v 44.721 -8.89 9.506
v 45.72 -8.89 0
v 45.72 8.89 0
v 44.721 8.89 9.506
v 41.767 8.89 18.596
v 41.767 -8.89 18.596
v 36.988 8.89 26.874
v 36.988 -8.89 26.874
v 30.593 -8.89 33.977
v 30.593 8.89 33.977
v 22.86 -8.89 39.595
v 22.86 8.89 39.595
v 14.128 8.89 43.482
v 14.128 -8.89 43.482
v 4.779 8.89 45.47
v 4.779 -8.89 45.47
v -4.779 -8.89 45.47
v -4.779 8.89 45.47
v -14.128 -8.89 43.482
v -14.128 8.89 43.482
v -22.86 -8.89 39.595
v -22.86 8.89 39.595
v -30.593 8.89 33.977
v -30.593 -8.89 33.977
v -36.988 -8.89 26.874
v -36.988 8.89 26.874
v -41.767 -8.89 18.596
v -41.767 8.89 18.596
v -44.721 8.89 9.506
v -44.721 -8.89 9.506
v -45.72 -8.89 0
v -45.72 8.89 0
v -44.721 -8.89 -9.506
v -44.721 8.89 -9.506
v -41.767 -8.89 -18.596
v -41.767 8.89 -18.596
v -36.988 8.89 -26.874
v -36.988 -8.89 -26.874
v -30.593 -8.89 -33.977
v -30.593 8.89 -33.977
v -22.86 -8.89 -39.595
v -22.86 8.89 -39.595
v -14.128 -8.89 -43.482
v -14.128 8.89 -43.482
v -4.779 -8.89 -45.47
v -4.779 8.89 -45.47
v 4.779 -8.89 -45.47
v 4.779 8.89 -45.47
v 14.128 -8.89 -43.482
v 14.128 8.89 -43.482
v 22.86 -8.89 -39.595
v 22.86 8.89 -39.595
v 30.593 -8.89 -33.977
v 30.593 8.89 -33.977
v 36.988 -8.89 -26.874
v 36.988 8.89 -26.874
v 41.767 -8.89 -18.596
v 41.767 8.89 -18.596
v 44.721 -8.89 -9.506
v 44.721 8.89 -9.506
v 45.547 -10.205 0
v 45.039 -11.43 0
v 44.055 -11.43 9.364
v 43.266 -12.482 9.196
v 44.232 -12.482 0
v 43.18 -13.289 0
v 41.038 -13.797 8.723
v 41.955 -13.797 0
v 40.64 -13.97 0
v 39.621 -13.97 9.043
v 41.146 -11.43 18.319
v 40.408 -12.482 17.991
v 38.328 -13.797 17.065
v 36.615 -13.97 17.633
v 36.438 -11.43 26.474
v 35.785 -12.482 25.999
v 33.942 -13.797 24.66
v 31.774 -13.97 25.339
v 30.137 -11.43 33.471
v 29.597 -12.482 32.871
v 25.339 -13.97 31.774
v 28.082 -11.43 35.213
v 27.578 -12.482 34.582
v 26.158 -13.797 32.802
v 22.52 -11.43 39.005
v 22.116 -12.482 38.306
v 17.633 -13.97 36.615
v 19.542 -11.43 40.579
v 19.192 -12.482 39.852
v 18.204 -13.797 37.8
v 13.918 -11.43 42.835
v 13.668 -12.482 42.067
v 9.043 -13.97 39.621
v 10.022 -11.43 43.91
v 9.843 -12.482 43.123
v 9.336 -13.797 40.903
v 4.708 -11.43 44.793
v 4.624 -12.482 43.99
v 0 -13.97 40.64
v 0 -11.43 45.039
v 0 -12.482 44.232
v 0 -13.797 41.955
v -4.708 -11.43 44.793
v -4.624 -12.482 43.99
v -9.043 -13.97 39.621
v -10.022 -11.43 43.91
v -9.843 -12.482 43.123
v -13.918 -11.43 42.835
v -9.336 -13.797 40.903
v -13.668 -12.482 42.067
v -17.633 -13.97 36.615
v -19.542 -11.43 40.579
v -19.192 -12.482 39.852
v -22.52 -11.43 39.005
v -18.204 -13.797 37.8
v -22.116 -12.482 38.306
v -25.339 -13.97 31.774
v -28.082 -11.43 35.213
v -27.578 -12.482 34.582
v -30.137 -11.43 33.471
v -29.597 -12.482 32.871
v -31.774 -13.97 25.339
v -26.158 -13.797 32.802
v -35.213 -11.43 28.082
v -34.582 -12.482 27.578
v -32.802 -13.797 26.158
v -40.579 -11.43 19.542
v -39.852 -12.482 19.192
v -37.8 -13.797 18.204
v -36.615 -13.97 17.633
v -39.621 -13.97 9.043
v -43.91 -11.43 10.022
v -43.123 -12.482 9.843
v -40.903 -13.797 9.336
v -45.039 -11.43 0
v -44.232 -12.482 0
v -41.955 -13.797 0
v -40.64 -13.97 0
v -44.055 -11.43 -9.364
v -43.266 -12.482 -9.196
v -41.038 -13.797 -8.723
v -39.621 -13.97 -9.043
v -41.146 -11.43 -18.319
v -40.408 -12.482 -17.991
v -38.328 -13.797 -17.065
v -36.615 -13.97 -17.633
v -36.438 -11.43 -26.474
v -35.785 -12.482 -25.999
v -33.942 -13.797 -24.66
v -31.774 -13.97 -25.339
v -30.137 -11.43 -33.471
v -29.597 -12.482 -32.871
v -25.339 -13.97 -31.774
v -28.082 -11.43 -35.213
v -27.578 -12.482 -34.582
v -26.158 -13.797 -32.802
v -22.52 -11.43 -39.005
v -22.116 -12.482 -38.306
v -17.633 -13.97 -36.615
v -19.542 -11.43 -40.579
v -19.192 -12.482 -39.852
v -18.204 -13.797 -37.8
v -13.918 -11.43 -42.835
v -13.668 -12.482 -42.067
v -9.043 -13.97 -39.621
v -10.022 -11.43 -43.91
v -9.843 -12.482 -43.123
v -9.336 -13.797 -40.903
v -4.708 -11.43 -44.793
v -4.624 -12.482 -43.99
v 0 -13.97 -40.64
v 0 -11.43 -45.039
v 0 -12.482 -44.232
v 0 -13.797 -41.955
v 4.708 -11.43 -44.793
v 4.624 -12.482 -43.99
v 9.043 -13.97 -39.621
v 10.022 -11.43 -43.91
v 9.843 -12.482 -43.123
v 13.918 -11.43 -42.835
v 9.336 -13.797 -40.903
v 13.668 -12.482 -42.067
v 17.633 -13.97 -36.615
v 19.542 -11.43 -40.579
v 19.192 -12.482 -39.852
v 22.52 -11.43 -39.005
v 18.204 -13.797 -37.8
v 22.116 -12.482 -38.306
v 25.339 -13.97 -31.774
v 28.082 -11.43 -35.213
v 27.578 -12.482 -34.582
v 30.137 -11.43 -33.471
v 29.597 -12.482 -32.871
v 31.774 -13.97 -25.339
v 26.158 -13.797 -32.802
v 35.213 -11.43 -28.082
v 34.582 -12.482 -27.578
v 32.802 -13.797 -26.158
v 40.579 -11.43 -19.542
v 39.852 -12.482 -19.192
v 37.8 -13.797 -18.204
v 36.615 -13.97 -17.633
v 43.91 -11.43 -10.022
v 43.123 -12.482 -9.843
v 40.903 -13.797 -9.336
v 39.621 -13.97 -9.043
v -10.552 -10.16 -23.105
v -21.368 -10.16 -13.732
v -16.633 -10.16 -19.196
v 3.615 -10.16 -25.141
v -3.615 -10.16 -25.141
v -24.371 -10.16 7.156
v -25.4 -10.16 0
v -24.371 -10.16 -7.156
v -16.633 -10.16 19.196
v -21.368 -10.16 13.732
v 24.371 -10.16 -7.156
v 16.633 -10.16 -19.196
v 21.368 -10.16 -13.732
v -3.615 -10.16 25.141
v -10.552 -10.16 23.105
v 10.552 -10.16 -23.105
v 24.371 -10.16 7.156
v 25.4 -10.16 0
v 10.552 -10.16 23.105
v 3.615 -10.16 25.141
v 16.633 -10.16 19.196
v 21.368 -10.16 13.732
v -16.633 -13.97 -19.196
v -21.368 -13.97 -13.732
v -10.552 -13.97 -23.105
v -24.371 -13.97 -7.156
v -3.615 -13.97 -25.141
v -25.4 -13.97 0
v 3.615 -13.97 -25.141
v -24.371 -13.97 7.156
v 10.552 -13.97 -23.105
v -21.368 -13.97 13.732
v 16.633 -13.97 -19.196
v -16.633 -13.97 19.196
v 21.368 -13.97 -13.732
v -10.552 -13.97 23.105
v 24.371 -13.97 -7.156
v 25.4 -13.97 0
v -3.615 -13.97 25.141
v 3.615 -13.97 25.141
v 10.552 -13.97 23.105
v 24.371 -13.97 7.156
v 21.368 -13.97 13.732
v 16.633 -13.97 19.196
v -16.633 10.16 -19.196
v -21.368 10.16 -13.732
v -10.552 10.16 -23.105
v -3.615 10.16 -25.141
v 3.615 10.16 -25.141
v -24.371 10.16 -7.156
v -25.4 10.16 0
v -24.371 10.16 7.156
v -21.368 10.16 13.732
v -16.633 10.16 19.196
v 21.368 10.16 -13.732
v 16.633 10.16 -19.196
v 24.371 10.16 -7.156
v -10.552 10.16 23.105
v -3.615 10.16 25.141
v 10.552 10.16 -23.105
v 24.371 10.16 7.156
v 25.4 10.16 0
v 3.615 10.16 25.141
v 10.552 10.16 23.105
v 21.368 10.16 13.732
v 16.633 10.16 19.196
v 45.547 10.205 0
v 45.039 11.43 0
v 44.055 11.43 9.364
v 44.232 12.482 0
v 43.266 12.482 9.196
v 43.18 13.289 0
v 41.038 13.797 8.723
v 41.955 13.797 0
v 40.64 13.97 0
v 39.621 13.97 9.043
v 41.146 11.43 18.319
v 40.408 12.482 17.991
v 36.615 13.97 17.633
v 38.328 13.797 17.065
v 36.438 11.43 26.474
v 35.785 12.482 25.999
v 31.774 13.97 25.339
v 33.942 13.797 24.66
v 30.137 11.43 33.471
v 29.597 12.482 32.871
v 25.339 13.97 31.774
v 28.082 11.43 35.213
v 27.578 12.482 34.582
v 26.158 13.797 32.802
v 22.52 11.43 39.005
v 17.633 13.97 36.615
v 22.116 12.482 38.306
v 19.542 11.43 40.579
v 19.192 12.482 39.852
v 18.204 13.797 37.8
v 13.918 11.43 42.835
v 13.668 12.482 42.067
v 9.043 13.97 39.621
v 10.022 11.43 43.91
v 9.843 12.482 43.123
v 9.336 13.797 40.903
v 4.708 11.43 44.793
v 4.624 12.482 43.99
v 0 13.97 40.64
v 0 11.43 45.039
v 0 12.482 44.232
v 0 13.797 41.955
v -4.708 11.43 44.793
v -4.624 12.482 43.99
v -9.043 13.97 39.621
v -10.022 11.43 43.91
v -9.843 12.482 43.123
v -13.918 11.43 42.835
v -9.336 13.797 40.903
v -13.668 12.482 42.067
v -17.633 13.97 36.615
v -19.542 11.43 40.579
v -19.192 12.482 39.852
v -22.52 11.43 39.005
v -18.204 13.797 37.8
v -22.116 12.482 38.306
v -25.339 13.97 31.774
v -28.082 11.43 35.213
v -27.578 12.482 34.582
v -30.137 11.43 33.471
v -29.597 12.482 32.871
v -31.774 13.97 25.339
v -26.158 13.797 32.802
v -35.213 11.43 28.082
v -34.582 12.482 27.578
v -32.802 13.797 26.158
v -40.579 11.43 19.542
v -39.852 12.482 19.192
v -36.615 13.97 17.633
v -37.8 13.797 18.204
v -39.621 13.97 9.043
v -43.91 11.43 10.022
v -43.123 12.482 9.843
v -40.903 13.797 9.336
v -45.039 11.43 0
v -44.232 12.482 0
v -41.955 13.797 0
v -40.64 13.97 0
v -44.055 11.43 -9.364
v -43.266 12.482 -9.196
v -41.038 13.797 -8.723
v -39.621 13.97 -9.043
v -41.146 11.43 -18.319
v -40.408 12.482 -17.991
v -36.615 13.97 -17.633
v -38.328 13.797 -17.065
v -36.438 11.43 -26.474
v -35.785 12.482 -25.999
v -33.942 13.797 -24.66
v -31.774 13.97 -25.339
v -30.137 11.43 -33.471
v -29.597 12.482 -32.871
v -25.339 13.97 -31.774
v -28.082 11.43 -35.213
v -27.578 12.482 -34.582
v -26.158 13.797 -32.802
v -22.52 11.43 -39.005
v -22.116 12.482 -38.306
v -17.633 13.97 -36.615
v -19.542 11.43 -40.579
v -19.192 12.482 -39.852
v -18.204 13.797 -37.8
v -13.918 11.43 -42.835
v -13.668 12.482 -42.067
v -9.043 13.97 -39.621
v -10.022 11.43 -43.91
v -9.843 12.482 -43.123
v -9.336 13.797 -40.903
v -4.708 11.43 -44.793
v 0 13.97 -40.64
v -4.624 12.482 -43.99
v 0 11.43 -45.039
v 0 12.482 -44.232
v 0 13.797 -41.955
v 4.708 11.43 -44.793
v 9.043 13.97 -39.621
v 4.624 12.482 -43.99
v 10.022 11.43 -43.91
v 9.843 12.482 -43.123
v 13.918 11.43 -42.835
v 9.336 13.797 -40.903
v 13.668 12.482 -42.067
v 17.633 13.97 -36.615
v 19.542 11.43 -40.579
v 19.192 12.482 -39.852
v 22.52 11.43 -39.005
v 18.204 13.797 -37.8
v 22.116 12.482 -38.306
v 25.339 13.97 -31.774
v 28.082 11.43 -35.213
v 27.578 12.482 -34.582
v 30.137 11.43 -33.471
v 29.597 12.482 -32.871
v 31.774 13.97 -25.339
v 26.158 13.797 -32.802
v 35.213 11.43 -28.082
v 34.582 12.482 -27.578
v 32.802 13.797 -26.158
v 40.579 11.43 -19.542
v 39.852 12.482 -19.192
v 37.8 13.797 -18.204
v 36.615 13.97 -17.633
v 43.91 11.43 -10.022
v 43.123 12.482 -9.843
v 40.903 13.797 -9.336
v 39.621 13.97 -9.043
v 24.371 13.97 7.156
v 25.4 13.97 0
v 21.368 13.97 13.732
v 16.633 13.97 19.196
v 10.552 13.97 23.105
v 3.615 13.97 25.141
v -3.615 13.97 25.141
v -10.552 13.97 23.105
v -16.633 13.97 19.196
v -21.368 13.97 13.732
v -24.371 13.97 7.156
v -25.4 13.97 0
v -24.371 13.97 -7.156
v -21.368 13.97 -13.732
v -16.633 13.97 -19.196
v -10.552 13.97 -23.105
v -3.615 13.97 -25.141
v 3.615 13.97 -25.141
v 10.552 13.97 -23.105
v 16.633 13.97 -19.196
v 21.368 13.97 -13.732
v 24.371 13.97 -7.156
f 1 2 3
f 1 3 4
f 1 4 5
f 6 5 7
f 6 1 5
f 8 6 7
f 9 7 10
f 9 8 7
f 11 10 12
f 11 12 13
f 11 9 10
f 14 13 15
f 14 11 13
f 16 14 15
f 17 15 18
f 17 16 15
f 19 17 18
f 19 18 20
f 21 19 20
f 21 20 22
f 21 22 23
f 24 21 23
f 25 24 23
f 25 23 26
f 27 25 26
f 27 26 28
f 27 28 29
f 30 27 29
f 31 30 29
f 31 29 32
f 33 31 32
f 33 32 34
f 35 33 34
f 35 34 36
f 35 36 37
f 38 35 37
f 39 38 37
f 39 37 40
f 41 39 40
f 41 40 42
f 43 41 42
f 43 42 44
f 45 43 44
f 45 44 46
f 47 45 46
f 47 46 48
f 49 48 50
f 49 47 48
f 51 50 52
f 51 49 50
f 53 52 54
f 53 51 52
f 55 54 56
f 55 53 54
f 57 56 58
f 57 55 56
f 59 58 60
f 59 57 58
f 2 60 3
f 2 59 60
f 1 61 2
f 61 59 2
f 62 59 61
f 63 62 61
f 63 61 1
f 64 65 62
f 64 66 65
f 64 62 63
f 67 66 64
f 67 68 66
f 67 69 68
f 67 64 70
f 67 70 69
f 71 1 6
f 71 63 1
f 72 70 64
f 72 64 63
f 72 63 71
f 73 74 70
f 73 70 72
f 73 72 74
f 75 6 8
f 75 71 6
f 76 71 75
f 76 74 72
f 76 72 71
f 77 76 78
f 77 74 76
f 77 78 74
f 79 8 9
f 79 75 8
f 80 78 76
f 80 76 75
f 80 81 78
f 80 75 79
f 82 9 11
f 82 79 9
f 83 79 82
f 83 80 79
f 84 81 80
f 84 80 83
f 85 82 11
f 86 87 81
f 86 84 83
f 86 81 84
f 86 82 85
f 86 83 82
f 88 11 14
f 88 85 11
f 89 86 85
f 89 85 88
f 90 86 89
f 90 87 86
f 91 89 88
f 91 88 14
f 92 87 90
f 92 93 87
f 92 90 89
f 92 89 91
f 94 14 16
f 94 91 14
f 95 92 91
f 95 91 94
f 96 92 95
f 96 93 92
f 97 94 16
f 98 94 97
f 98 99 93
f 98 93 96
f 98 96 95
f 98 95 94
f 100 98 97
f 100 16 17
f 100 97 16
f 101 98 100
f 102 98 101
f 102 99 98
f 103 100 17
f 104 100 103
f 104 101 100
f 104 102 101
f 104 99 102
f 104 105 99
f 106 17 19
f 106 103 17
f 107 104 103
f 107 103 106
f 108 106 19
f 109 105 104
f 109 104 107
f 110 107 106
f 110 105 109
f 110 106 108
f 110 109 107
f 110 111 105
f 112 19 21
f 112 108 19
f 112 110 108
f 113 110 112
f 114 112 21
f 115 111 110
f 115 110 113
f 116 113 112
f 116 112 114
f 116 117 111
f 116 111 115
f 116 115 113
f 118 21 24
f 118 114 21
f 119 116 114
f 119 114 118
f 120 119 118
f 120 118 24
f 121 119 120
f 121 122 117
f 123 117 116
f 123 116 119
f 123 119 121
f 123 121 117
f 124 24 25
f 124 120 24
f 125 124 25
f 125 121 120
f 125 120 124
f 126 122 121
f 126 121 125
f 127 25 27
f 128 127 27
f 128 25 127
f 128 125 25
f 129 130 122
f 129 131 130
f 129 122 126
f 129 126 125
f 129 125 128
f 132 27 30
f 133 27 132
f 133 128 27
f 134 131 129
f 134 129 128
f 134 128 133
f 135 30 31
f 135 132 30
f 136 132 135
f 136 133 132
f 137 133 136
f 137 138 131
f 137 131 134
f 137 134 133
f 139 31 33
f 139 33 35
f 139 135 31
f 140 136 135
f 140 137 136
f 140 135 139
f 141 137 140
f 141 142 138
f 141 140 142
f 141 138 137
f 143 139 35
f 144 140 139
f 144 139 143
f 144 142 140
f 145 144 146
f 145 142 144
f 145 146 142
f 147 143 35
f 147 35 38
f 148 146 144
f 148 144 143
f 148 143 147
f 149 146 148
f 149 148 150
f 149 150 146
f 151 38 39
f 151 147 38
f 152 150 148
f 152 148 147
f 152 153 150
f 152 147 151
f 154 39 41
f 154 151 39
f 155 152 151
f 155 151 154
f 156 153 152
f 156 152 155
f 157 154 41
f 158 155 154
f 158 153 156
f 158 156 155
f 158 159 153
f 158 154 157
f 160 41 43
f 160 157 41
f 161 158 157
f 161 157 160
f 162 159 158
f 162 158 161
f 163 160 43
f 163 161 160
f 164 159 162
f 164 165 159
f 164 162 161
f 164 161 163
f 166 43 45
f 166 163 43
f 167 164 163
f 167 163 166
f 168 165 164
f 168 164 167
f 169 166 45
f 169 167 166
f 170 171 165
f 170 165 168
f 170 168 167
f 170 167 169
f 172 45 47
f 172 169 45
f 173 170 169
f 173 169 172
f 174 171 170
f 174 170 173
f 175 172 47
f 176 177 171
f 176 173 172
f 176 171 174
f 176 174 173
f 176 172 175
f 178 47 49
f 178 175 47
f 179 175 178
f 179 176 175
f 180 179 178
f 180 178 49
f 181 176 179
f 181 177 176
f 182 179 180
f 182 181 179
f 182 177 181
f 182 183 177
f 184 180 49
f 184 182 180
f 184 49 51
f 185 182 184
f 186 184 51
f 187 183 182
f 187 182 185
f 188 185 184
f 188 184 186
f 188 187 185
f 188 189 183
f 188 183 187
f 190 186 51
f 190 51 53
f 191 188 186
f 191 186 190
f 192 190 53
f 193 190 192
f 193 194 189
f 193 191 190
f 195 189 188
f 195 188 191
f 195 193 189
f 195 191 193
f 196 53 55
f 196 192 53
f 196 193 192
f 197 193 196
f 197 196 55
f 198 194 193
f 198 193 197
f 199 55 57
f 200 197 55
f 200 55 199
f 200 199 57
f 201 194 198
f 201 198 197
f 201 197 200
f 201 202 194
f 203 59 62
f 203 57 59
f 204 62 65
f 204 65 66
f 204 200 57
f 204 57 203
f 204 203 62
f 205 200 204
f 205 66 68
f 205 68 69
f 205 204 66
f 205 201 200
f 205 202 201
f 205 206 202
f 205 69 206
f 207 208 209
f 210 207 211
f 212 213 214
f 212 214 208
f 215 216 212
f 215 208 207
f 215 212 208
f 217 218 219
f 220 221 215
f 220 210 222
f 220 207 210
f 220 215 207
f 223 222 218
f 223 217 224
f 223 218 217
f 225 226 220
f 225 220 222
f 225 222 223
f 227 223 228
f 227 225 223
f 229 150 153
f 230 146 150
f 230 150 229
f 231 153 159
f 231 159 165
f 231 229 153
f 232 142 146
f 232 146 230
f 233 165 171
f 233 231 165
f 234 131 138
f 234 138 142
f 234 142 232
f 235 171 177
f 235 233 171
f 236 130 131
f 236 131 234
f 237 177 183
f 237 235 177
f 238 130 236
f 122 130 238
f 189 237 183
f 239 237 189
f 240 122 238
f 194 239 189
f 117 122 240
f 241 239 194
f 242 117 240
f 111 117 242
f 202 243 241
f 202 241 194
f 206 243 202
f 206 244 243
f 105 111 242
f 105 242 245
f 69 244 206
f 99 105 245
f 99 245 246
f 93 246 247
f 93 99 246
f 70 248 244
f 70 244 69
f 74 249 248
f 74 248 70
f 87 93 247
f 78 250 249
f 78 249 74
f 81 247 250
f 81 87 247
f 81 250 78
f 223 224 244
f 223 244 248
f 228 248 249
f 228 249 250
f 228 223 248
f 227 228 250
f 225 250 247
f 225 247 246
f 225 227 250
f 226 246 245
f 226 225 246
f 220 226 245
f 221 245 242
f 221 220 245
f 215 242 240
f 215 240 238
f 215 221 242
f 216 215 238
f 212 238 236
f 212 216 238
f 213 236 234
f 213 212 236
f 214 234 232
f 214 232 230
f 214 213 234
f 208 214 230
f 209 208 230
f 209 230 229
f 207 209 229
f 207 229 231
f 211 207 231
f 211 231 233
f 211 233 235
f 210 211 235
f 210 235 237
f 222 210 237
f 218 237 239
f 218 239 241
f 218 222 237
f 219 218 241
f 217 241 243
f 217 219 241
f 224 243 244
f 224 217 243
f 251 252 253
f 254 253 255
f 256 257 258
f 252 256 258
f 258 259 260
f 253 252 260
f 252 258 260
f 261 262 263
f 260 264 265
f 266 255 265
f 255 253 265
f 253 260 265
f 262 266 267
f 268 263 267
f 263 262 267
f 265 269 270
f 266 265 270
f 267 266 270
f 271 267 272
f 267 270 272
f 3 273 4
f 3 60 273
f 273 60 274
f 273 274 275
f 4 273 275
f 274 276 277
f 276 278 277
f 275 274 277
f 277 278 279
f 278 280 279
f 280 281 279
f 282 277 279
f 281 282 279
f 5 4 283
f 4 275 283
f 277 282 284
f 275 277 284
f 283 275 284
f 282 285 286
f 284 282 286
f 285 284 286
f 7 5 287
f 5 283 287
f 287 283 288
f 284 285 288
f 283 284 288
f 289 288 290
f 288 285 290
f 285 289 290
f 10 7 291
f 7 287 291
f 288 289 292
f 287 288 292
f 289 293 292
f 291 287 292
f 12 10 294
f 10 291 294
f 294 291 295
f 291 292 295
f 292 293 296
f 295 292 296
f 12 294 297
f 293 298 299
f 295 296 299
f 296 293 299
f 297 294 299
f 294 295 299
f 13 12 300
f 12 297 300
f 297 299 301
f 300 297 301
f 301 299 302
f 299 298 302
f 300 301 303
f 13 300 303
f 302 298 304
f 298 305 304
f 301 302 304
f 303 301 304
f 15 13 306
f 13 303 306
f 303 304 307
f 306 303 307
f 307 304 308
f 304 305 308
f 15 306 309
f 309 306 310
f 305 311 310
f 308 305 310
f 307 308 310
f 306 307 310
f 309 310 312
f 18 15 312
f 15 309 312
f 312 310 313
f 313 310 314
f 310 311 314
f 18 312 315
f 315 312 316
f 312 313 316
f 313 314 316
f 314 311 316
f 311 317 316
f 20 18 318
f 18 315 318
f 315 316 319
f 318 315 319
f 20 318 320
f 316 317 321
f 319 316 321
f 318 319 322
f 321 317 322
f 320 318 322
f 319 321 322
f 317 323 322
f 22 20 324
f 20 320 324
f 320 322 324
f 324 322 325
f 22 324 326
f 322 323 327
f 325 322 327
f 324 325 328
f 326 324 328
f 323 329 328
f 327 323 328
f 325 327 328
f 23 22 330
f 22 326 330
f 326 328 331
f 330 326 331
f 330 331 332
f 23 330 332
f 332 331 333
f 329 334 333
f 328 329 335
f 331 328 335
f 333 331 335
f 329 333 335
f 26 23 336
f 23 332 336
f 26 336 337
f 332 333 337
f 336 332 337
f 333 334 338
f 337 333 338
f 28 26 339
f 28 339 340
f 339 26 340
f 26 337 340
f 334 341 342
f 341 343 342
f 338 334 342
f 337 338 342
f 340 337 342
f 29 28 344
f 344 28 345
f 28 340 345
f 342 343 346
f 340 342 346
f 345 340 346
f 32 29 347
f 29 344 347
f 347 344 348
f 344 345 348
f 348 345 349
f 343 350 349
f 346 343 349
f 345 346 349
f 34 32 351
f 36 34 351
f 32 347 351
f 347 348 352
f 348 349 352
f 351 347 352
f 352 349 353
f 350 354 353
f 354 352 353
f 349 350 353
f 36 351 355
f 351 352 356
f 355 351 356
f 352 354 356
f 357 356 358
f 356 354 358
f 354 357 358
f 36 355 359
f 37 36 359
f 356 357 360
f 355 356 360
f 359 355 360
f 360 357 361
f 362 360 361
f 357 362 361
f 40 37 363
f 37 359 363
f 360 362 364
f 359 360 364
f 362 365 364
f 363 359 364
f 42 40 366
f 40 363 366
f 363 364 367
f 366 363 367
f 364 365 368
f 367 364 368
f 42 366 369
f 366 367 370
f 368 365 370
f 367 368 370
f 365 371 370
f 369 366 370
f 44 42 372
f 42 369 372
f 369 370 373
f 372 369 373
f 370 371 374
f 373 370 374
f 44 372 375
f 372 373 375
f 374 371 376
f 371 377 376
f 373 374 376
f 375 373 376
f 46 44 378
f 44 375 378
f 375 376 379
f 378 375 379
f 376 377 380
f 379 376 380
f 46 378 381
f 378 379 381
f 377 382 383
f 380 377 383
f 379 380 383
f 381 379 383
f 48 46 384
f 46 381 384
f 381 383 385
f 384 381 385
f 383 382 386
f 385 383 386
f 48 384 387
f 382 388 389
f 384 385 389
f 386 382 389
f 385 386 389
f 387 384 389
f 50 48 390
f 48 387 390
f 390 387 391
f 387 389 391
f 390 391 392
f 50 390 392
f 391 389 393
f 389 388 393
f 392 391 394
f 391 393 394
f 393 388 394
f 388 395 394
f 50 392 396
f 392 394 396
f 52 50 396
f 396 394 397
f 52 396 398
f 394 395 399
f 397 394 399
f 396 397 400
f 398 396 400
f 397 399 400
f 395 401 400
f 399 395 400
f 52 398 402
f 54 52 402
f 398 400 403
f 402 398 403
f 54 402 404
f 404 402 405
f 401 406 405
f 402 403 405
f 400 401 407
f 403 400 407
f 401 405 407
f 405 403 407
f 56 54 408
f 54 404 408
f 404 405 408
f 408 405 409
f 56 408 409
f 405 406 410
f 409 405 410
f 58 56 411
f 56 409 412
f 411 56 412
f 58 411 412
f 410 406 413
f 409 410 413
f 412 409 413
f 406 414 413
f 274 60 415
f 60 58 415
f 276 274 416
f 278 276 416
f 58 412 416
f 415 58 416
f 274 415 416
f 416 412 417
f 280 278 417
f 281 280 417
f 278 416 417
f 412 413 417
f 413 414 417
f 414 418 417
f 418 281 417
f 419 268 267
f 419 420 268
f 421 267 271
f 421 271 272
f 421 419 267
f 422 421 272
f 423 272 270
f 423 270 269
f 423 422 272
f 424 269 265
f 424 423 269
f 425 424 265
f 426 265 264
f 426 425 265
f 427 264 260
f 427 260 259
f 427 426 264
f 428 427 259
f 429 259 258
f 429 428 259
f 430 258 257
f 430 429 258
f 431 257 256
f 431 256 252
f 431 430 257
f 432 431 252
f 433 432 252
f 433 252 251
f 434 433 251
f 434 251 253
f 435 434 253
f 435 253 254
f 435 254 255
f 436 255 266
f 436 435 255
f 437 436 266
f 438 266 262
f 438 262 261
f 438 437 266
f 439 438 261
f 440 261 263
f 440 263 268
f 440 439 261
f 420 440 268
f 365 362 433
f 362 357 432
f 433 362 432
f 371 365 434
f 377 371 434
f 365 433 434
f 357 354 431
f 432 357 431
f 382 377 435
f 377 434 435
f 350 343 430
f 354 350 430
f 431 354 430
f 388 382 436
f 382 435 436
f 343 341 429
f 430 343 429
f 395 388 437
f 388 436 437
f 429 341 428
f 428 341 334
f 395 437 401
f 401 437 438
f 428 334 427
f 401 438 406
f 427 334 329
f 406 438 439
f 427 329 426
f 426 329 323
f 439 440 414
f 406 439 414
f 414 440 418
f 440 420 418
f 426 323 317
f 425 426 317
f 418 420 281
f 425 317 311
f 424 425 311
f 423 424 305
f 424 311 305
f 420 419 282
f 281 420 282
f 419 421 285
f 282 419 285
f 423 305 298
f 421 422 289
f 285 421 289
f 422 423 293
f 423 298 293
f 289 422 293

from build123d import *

# Parameters (mm, degrees)
F0_R     = 25.4
F1_DEPTH = 10.16
F2_R     = 45.72
F2_R_2   = 25.4
F3_DEPTH = 13.97
F4_R     = 5.08


with BuildPart() as f1:
    # F0 (on Front) → F1 (new body, symmetric)
    with BuildSketch(Plane.XZ):
        Circle(F0_R)
    extrude(amount=F1_DEPTH, both=True)

    # F2 (on Front) → F3 (join, symmetric)
    with BuildSketch(Plane.XZ):
        Circle(F2_R)
        Circle(F2_R_2, mode=Mode.SUBTRACT)
    extrude(amount=F3_DEPTH, both=True)

    # F4
    f4_edges = [f1.edges().sort_by_distance(p)[0] for p in [
        (-45.72, 13.97, 0),
        (-45.72, -13.97, 0),
    ]]
    fillet(f4_edges, radius=F4_R)


solid = f1.part
